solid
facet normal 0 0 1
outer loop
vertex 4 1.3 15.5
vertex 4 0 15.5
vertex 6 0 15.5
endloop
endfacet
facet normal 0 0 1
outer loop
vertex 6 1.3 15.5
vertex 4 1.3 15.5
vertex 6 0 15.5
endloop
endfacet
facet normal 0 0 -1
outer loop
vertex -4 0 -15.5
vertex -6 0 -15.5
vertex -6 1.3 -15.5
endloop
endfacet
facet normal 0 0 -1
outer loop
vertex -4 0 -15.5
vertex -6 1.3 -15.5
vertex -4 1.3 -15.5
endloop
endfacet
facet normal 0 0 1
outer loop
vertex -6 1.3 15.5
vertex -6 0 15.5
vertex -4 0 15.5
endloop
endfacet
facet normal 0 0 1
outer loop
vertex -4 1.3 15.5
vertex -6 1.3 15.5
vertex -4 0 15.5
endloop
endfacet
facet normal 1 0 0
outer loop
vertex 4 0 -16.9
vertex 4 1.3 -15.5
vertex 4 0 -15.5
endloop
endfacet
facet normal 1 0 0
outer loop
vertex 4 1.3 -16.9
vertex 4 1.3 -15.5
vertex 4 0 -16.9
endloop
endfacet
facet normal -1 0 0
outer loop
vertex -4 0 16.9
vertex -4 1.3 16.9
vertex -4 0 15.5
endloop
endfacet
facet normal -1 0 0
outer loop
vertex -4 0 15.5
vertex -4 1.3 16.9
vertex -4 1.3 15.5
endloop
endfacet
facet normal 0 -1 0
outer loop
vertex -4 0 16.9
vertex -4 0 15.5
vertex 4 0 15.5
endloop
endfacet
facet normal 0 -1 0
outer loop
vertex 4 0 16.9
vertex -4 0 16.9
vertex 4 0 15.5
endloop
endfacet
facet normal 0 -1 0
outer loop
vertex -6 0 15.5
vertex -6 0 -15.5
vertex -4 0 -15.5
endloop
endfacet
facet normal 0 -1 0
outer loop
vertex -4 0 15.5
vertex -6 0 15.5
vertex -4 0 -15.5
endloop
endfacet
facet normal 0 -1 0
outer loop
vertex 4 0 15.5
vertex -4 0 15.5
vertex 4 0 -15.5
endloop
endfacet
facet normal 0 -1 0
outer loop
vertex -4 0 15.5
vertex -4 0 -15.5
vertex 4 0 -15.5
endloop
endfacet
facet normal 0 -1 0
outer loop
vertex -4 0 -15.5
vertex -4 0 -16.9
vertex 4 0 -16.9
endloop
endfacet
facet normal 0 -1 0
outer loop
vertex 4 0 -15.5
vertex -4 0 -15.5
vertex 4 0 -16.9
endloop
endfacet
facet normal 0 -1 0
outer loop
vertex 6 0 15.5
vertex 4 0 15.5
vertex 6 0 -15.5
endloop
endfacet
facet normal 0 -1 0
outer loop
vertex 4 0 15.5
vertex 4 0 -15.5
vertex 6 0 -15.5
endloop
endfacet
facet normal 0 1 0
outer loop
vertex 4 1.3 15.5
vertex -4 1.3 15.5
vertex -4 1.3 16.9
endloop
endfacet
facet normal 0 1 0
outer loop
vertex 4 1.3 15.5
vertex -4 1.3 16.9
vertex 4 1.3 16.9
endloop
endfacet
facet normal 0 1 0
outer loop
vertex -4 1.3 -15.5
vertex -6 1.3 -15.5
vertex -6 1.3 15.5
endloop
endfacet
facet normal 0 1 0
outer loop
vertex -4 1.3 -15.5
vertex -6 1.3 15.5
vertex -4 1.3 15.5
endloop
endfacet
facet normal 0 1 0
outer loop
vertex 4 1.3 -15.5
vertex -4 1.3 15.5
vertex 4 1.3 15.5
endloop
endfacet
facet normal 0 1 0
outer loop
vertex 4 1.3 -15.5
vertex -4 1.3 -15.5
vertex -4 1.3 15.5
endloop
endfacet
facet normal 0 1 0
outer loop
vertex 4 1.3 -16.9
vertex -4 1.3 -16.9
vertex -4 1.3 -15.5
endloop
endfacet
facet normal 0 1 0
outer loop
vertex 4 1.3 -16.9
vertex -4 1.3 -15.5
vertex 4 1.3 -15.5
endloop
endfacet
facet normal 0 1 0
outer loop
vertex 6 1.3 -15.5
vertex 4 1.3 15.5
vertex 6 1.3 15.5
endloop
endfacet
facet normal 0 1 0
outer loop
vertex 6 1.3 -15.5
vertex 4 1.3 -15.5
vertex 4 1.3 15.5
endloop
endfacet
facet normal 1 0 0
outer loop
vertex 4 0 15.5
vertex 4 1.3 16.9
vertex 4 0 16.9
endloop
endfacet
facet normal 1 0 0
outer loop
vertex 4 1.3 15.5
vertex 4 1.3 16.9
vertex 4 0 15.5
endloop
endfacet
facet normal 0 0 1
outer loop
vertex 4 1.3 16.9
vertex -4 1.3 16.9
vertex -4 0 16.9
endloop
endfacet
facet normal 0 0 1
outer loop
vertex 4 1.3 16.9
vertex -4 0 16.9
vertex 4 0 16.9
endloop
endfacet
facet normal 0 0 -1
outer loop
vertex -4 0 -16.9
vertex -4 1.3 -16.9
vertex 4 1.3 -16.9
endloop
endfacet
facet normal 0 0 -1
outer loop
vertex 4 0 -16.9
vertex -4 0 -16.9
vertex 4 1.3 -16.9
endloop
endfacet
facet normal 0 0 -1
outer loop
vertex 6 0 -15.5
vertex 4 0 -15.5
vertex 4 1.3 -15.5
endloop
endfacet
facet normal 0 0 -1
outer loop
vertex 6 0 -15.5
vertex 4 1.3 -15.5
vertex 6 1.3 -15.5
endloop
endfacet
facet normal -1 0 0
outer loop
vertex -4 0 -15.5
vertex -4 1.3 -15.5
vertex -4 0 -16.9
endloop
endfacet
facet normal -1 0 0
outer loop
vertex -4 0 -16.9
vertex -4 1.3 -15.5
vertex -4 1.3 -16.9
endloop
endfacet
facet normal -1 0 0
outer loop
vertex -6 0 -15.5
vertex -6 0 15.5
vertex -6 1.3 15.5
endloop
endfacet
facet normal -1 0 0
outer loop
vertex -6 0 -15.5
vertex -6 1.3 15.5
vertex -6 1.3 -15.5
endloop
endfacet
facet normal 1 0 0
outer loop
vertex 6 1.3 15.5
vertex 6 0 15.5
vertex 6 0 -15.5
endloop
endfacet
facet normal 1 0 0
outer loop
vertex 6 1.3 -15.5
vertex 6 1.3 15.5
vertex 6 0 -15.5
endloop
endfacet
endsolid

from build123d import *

# Parameters (mm, degrees)
SKETCH1_W           = 12
SKETCH1_H           = 31
BOSS_EXTRUDE1_DEPTH = 1.3
SKETCH2_W           = 8
SKETCH2_H           = 1.4
BOSS_EXTRUDE2_DEPTH = 1.3


with BuildPart() as part:
    # Sketch1 → Boss-Extrude1 (new body)
    with BuildSketch(Plane(origin=(0, 0, 0), x_dir=(1, 0, 0), z_dir=(0, 1, 0))):
        Rectangle(SKETCH1_W, SKETCH1_H)
    extrude(amount=BOSS_EXTRUDE1_DEPTH)

    # Sketch2 → Boss-Extrude2 (add)
    with BuildSketch(Plane(origin=(0, 1.3, 0), x_dir=(1, 0, 0), z_dir=(0, 1, 0))):
        with Locations((0, 16.2)):
            Rectangle(SKETCH2_W, SKETCH2_H)
        with Locations((0, -16.2)):
            Rectangle(SKETCH2_W, SKETCH2_H)
    extrude(amount=-BOSS_EXTRUDE2_DEPTH)


solid = part.part
